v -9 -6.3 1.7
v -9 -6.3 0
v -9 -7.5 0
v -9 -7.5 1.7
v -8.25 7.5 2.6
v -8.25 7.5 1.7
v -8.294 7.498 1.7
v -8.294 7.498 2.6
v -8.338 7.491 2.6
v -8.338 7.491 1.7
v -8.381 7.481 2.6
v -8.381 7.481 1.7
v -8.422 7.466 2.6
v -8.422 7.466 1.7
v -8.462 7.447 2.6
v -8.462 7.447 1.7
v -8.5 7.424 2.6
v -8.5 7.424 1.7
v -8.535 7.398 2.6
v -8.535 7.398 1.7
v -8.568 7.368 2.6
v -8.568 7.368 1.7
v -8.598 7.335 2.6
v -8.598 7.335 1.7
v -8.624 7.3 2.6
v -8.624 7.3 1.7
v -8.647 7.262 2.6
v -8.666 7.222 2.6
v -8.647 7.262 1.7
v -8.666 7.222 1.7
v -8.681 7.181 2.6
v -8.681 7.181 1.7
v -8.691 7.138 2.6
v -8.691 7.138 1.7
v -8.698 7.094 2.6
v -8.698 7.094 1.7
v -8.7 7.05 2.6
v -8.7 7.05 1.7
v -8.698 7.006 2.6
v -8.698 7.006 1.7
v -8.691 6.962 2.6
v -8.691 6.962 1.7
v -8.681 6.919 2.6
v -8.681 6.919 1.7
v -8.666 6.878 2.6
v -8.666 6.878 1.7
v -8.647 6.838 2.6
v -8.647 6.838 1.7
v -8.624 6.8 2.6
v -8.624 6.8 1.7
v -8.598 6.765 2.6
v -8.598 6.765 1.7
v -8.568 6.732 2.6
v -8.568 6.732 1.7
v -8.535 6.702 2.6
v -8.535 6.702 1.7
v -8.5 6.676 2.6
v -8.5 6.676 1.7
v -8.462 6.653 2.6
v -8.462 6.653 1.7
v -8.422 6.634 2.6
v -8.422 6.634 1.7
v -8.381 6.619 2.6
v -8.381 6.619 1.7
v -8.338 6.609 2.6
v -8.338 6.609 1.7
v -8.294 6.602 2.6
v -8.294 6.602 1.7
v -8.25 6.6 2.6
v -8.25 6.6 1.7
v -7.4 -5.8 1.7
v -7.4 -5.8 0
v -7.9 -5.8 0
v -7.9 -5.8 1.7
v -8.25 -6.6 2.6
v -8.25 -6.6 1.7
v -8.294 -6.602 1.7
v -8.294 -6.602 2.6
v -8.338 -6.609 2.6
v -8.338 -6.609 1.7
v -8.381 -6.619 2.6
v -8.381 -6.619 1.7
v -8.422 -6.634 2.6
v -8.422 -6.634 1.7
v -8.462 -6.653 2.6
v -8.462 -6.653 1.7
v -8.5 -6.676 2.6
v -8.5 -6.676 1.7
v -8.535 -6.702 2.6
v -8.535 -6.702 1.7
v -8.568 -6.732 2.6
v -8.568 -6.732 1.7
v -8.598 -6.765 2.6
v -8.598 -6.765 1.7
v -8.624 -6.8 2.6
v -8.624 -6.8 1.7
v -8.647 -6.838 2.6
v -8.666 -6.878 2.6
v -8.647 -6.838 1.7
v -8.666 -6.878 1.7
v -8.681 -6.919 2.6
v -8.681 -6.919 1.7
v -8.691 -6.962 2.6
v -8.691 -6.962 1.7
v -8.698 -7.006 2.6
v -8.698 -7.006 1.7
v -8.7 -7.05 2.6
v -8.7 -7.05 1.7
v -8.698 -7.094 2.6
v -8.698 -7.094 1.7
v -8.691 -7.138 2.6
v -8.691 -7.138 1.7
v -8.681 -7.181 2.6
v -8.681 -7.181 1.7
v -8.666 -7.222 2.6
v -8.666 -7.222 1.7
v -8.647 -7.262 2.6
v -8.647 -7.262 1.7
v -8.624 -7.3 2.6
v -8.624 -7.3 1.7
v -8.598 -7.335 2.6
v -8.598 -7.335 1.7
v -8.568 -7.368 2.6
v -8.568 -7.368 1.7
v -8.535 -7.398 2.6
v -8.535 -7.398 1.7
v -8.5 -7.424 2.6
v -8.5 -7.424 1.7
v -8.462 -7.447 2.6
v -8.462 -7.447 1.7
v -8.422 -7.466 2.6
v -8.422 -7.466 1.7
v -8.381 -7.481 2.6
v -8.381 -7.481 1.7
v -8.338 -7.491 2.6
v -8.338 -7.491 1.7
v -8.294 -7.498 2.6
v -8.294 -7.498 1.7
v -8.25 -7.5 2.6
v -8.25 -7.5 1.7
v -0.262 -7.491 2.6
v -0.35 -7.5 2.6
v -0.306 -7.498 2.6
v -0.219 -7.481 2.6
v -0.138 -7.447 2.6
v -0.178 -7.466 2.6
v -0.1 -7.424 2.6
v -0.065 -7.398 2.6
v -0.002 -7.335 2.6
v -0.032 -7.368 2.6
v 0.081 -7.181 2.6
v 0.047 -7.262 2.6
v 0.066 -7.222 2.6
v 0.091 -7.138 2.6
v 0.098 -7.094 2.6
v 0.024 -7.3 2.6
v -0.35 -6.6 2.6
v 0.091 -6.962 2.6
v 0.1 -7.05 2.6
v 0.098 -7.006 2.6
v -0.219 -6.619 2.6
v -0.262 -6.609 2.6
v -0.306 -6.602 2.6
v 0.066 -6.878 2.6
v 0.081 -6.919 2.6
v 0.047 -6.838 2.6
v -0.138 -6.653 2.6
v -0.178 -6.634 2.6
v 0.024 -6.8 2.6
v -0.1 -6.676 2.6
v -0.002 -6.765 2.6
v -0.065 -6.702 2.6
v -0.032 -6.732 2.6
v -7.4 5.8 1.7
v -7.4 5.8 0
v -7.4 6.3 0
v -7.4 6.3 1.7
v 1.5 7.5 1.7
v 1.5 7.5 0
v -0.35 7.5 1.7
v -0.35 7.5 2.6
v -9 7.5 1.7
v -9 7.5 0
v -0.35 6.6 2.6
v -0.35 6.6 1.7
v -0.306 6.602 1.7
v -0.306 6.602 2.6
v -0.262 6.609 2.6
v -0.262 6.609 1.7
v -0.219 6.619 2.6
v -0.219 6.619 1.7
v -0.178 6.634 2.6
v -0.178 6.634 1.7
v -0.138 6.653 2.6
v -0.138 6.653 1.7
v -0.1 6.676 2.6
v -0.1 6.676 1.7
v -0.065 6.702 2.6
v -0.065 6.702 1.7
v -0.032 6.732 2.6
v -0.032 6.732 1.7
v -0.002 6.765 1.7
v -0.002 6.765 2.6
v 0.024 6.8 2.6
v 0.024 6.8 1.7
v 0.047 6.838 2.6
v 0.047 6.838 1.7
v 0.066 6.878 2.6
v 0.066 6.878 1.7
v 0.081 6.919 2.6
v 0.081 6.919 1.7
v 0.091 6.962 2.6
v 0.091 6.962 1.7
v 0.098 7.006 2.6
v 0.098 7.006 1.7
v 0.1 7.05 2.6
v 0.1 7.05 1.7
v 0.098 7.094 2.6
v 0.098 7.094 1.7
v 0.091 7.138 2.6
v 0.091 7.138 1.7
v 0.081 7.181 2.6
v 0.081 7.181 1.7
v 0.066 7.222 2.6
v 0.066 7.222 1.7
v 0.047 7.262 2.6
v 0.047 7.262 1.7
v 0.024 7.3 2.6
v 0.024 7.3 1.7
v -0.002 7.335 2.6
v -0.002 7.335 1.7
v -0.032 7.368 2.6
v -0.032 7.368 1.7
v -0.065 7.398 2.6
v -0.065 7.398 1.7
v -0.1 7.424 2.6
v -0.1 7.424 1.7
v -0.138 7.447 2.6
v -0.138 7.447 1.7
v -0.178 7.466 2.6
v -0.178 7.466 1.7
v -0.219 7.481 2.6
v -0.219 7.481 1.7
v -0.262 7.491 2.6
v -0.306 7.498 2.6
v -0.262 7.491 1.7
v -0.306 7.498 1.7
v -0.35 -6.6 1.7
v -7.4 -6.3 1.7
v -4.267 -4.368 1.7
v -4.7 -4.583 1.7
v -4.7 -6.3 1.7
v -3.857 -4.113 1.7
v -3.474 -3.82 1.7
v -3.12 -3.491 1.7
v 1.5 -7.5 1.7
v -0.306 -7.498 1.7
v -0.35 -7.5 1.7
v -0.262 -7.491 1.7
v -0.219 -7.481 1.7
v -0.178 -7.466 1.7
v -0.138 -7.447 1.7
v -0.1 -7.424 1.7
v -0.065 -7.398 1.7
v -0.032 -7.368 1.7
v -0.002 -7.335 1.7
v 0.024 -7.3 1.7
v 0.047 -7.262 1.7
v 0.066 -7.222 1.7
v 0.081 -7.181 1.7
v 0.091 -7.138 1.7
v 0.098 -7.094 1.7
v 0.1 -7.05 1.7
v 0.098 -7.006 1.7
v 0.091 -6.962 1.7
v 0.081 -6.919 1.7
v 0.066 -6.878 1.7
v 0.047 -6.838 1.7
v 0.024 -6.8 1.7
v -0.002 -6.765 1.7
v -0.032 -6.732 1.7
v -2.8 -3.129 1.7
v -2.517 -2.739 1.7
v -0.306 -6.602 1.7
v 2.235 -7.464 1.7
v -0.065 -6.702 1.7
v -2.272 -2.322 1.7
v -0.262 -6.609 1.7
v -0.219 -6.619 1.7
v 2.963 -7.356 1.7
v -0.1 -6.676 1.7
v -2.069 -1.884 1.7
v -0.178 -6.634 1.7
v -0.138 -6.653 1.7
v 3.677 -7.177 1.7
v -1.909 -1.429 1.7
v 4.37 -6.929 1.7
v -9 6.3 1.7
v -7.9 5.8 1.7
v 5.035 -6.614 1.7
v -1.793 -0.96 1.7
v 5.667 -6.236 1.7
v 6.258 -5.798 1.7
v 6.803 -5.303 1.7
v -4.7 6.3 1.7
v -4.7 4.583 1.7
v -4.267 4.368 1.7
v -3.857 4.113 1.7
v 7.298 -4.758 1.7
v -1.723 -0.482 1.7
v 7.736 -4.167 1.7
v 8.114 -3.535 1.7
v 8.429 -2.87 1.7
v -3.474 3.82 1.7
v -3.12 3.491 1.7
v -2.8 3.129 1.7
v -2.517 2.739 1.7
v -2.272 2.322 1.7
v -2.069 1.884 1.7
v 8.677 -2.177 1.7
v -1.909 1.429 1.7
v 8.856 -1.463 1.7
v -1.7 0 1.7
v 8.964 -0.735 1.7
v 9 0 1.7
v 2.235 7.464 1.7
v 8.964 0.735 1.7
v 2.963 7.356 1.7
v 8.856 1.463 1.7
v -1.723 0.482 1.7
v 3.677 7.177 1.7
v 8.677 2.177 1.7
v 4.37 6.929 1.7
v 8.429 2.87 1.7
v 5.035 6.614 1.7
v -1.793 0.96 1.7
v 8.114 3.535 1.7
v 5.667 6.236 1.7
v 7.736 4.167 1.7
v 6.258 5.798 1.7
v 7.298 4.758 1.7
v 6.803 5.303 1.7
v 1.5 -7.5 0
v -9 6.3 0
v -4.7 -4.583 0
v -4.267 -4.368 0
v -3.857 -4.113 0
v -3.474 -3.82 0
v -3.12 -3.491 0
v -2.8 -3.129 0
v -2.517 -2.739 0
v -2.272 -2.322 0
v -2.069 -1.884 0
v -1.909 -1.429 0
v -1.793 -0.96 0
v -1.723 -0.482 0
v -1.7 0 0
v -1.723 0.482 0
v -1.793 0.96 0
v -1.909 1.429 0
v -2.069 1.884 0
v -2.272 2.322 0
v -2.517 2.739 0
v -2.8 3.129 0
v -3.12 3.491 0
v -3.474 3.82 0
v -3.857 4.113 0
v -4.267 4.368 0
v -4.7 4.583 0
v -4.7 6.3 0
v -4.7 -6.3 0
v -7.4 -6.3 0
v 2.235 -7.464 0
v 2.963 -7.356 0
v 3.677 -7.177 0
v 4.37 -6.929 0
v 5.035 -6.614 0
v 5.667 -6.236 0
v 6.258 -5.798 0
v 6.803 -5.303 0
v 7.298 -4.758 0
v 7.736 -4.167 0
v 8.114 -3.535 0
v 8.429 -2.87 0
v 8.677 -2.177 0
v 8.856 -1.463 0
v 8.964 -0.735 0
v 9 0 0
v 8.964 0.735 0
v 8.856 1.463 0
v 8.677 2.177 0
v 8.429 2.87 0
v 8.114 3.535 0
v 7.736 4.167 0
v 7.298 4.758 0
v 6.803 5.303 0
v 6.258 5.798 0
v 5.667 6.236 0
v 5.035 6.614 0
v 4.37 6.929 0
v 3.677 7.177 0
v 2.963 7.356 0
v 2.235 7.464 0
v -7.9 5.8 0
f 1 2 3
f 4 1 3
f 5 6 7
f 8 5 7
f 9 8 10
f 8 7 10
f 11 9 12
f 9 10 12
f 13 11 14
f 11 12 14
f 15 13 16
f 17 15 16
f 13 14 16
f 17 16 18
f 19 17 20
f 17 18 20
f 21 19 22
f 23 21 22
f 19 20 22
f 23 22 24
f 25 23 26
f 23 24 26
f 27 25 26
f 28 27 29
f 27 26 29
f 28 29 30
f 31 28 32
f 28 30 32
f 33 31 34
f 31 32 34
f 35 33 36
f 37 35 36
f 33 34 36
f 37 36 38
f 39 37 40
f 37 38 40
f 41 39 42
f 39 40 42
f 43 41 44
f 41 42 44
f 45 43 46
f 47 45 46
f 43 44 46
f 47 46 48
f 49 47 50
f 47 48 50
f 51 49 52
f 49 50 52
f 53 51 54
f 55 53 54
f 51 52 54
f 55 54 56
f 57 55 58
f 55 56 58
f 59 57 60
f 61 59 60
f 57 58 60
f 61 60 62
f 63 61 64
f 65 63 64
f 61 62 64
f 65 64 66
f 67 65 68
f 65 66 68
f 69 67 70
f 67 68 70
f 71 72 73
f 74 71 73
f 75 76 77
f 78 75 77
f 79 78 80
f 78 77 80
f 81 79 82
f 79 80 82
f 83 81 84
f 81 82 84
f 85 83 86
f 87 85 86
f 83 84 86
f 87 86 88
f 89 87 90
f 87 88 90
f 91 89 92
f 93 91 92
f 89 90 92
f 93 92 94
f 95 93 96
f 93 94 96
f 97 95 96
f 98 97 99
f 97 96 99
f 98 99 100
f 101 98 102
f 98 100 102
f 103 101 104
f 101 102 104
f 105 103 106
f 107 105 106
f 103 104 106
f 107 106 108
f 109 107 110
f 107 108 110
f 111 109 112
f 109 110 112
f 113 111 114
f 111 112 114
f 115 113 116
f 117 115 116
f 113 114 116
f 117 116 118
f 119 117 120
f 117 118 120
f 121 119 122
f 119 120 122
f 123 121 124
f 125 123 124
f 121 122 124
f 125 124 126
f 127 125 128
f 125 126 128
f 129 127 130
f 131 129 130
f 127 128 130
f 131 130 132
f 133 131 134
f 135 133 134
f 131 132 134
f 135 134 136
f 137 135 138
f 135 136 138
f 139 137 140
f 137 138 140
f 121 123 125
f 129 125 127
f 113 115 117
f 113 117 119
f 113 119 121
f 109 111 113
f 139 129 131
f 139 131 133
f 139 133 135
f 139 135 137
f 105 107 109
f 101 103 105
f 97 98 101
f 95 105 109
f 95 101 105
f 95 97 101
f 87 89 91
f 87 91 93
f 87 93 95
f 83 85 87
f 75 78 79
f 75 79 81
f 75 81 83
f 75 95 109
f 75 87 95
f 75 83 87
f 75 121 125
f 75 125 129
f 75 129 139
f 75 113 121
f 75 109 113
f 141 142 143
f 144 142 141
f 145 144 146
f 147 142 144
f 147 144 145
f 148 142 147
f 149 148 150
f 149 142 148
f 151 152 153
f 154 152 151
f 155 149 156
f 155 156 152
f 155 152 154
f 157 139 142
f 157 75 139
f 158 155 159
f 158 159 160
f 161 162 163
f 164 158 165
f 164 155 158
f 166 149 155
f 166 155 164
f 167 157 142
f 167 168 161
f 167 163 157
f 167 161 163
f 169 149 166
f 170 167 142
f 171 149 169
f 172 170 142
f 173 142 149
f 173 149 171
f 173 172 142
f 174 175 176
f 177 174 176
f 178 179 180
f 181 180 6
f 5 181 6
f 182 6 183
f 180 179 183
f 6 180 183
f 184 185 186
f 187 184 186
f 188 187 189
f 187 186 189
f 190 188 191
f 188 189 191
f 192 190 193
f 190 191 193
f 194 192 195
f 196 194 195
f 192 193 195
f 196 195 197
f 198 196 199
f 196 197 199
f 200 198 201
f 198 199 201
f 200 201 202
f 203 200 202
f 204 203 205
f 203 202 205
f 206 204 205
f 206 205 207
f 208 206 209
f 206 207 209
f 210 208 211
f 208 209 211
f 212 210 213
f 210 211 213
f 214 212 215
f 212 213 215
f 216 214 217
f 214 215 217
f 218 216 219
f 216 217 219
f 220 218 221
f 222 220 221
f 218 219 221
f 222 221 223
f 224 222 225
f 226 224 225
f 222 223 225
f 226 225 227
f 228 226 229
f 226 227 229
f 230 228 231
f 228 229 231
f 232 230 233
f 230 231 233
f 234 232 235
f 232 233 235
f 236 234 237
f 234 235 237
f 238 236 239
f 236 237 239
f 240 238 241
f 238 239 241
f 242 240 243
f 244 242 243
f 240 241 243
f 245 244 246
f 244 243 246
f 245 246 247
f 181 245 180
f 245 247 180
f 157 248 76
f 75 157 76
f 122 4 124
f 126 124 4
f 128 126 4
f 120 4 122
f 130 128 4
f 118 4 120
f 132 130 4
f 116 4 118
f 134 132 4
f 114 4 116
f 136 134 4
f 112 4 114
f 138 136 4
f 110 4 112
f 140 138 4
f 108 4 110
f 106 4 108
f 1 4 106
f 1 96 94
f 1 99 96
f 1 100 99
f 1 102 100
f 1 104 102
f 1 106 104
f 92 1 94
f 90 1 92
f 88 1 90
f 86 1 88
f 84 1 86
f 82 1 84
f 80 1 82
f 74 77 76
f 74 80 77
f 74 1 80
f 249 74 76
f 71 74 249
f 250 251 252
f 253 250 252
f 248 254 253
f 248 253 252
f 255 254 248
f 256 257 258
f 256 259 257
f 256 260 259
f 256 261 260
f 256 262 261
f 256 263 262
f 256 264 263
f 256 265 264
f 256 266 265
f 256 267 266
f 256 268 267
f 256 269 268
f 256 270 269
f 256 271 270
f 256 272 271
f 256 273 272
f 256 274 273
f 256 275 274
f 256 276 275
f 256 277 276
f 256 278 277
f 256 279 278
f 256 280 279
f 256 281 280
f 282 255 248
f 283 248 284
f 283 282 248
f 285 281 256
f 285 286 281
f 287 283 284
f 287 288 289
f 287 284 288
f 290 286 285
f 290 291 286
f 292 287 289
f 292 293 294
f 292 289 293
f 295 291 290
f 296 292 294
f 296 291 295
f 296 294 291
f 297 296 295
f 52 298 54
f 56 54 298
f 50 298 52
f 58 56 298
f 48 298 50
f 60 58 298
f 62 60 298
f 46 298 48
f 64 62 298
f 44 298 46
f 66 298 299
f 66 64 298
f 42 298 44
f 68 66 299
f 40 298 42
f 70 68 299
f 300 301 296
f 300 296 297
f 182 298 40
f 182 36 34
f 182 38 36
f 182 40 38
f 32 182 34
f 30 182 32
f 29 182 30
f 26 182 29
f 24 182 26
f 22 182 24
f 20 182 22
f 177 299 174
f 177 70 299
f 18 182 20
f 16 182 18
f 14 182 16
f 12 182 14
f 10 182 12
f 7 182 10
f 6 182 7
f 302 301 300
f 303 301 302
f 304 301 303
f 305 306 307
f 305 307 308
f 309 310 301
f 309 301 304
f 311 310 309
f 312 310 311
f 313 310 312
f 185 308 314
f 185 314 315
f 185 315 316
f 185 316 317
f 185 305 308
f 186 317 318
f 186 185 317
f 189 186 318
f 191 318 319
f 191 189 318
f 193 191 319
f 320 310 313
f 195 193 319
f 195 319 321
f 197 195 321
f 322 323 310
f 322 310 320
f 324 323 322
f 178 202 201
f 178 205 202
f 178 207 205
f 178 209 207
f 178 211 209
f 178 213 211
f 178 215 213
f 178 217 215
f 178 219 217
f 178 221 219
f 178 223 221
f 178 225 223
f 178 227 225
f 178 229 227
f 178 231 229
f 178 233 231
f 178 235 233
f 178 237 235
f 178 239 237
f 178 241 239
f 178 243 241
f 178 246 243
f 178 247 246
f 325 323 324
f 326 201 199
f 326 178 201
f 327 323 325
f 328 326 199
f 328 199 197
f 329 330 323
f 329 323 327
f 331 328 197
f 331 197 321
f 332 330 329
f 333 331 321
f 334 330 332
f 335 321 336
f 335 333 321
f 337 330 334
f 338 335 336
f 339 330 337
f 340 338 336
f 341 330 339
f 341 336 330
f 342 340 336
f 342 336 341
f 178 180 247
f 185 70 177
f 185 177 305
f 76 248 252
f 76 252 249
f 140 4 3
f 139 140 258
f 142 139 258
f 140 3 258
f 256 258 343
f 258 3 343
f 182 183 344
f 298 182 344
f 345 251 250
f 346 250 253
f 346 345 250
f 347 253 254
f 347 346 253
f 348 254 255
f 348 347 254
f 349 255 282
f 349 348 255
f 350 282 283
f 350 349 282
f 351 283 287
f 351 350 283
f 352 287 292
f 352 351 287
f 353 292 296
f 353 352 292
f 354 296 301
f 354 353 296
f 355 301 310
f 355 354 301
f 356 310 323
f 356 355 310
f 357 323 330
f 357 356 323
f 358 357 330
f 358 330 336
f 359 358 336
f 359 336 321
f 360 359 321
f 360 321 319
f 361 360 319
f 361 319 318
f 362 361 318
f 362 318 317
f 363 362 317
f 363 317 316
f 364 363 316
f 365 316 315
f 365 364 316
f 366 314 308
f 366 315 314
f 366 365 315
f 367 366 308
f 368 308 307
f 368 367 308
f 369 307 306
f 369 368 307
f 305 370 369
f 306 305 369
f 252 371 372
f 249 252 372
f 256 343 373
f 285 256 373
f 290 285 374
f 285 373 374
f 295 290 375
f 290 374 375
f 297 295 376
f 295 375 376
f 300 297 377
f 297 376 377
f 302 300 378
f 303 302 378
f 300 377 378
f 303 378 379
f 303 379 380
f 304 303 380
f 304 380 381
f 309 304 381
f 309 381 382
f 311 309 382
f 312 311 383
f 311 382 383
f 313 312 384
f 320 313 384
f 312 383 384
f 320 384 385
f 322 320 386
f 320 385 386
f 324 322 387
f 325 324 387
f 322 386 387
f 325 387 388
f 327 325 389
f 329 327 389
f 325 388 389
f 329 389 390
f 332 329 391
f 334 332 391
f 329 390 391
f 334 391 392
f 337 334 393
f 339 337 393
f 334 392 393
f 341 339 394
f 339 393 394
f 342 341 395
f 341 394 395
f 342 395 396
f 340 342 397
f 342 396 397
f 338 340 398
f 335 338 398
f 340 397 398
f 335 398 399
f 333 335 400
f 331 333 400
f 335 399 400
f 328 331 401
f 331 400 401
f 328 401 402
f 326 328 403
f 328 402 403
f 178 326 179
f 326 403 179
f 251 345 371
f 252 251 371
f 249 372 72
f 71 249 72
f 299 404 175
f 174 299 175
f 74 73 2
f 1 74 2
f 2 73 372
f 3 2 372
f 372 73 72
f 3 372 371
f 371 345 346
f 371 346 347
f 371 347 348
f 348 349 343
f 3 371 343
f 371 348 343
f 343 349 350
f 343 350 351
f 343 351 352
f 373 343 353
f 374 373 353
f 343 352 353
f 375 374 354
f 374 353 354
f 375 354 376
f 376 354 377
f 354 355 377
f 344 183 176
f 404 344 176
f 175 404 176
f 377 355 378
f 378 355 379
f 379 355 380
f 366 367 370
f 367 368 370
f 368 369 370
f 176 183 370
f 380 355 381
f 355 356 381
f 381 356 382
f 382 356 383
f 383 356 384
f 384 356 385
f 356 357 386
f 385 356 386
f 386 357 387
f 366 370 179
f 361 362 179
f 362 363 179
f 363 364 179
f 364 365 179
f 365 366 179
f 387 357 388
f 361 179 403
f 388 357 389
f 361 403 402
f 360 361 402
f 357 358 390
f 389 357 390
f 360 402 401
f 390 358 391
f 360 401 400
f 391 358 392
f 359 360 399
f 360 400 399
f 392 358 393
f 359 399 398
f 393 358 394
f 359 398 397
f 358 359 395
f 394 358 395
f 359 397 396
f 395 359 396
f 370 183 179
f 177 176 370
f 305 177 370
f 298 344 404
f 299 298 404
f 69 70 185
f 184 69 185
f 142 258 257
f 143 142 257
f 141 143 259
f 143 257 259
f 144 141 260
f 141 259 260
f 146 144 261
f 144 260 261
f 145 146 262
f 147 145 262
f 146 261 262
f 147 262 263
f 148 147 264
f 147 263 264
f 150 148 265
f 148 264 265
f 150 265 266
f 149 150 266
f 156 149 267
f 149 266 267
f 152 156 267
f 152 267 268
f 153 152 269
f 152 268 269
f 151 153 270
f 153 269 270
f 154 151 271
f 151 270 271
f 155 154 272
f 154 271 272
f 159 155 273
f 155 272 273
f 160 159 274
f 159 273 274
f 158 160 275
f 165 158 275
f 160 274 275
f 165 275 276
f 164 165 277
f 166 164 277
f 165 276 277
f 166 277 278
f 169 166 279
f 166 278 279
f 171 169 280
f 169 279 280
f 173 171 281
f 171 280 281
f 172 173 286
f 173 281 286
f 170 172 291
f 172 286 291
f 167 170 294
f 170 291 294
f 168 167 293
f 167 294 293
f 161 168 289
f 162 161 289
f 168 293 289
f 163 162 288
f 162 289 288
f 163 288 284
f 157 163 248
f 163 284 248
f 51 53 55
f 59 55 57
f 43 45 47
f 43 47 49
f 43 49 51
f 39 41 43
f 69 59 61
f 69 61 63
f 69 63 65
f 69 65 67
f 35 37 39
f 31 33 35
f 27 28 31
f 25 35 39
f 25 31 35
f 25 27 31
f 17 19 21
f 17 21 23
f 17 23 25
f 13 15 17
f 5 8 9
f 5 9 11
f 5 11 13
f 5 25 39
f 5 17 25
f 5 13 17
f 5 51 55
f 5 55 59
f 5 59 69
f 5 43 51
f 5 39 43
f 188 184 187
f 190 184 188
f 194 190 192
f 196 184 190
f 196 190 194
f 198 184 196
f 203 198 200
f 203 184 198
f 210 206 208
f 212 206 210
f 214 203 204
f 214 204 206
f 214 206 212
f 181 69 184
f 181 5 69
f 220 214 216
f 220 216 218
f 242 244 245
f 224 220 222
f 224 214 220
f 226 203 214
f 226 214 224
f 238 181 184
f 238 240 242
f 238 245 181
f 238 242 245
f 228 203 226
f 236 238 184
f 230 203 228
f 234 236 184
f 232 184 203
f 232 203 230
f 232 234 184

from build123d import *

# Parameters (mm, degrees)
F2_DEPTH = 1.7
F3_DEPTH = 2
F5_DEPTH = 0.9


with BuildPart() as f2:
    # F0 (on Top) → F2 (new body)
    with BuildSketch(Plane.XY):
        with BuildLine():
            Line((1.5, 7.5), (-9, 7.5))
            Line((-9, 7.5), (-9, 6.3))
            Line((-9, 6.3), (-7.9, 5.8))
            Line((-7.9, 5.8), (-7.4, 5.8))
            Line((-7.4, 5.8), (-7.4, 6.3))
            Line((-7.4, 6.3), (-4.7, 6.3))
            Line((-4.7, 6.3), (-4.7, 4.5))
            Line((-4.7, 4.5), (-4.7, -6.3))
            Line((-4.7, -6.3), (-7.4, -6.3))
            Line((-7.4, -6.3), (-7.4, -5.8))
            Line((-7.4, -5.8), (-7.9, -5.8))
            Line((-7.9, -5.8), (-9, -6.3))
            Line((-9, -6.3), (-9, -7.5))
            Line((-9, -7.5), (1.5, -7.5))
            ThreePointArc((1.5, -7.5), (9, 0), (1.5, 7.5))
        make_face()
    extrude(amount=F2_DEPTH)

    # F1 (on Top) → F3 (cut)
    with BuildSketch(Plane.XY):
        with BuildLine():
            Line((-4.7, -5.5), (-4.7, -4.582576))
            ThreePointArc((-4.7, -4.582576), (-1.7, 0), (-4.7, 4.582576))
            Line((-4.7, 4.582576), (-4.7, 5.5))
            Line((-4.7, 5.5), (-13.7, 5.5))
            Line((-13.7, 5.5), (-13.7, -5.5))
            Line((-13.7, -5.5), (-4.7, -5.5))
        make_face()
    extrude(amount=F3_DEPTH, mode=Mode.SUBTRACT)

    # F4 (on face) → F5 (join)
    with BuildSketch(Plane.XY.offset(1.7)):
        with BuildLine():
            Line((-0.35, 7.5), (-8.25, 7.5))
            ThreePointArc((-8.25, 7.5), (-8.7, 7.05), (-8.25, 6.6))
            Line((-8.25, 6.6), (-0.35, 6.6))
            ThreePointArc((-0.35, 6.6), (0.1, 7.05), (-0.35, 7.5))
        make_face()
        with BuildLine():
            Line((-0.35, -6.6), (-8.25, -6.6))
            ThreePointArc((-8.25, -6.6), (-8.7, -7.05), (-8.25, -7.5))
            Line((-8.25, -7.5), (-0.35, -7.5))
            ThreePointArc((-0.35, -7.5), (0.1, -7.05), (-0.35, -6.6))
        make_face()
    extrude(amount=F5_DEPTH)


solid = f2.part
